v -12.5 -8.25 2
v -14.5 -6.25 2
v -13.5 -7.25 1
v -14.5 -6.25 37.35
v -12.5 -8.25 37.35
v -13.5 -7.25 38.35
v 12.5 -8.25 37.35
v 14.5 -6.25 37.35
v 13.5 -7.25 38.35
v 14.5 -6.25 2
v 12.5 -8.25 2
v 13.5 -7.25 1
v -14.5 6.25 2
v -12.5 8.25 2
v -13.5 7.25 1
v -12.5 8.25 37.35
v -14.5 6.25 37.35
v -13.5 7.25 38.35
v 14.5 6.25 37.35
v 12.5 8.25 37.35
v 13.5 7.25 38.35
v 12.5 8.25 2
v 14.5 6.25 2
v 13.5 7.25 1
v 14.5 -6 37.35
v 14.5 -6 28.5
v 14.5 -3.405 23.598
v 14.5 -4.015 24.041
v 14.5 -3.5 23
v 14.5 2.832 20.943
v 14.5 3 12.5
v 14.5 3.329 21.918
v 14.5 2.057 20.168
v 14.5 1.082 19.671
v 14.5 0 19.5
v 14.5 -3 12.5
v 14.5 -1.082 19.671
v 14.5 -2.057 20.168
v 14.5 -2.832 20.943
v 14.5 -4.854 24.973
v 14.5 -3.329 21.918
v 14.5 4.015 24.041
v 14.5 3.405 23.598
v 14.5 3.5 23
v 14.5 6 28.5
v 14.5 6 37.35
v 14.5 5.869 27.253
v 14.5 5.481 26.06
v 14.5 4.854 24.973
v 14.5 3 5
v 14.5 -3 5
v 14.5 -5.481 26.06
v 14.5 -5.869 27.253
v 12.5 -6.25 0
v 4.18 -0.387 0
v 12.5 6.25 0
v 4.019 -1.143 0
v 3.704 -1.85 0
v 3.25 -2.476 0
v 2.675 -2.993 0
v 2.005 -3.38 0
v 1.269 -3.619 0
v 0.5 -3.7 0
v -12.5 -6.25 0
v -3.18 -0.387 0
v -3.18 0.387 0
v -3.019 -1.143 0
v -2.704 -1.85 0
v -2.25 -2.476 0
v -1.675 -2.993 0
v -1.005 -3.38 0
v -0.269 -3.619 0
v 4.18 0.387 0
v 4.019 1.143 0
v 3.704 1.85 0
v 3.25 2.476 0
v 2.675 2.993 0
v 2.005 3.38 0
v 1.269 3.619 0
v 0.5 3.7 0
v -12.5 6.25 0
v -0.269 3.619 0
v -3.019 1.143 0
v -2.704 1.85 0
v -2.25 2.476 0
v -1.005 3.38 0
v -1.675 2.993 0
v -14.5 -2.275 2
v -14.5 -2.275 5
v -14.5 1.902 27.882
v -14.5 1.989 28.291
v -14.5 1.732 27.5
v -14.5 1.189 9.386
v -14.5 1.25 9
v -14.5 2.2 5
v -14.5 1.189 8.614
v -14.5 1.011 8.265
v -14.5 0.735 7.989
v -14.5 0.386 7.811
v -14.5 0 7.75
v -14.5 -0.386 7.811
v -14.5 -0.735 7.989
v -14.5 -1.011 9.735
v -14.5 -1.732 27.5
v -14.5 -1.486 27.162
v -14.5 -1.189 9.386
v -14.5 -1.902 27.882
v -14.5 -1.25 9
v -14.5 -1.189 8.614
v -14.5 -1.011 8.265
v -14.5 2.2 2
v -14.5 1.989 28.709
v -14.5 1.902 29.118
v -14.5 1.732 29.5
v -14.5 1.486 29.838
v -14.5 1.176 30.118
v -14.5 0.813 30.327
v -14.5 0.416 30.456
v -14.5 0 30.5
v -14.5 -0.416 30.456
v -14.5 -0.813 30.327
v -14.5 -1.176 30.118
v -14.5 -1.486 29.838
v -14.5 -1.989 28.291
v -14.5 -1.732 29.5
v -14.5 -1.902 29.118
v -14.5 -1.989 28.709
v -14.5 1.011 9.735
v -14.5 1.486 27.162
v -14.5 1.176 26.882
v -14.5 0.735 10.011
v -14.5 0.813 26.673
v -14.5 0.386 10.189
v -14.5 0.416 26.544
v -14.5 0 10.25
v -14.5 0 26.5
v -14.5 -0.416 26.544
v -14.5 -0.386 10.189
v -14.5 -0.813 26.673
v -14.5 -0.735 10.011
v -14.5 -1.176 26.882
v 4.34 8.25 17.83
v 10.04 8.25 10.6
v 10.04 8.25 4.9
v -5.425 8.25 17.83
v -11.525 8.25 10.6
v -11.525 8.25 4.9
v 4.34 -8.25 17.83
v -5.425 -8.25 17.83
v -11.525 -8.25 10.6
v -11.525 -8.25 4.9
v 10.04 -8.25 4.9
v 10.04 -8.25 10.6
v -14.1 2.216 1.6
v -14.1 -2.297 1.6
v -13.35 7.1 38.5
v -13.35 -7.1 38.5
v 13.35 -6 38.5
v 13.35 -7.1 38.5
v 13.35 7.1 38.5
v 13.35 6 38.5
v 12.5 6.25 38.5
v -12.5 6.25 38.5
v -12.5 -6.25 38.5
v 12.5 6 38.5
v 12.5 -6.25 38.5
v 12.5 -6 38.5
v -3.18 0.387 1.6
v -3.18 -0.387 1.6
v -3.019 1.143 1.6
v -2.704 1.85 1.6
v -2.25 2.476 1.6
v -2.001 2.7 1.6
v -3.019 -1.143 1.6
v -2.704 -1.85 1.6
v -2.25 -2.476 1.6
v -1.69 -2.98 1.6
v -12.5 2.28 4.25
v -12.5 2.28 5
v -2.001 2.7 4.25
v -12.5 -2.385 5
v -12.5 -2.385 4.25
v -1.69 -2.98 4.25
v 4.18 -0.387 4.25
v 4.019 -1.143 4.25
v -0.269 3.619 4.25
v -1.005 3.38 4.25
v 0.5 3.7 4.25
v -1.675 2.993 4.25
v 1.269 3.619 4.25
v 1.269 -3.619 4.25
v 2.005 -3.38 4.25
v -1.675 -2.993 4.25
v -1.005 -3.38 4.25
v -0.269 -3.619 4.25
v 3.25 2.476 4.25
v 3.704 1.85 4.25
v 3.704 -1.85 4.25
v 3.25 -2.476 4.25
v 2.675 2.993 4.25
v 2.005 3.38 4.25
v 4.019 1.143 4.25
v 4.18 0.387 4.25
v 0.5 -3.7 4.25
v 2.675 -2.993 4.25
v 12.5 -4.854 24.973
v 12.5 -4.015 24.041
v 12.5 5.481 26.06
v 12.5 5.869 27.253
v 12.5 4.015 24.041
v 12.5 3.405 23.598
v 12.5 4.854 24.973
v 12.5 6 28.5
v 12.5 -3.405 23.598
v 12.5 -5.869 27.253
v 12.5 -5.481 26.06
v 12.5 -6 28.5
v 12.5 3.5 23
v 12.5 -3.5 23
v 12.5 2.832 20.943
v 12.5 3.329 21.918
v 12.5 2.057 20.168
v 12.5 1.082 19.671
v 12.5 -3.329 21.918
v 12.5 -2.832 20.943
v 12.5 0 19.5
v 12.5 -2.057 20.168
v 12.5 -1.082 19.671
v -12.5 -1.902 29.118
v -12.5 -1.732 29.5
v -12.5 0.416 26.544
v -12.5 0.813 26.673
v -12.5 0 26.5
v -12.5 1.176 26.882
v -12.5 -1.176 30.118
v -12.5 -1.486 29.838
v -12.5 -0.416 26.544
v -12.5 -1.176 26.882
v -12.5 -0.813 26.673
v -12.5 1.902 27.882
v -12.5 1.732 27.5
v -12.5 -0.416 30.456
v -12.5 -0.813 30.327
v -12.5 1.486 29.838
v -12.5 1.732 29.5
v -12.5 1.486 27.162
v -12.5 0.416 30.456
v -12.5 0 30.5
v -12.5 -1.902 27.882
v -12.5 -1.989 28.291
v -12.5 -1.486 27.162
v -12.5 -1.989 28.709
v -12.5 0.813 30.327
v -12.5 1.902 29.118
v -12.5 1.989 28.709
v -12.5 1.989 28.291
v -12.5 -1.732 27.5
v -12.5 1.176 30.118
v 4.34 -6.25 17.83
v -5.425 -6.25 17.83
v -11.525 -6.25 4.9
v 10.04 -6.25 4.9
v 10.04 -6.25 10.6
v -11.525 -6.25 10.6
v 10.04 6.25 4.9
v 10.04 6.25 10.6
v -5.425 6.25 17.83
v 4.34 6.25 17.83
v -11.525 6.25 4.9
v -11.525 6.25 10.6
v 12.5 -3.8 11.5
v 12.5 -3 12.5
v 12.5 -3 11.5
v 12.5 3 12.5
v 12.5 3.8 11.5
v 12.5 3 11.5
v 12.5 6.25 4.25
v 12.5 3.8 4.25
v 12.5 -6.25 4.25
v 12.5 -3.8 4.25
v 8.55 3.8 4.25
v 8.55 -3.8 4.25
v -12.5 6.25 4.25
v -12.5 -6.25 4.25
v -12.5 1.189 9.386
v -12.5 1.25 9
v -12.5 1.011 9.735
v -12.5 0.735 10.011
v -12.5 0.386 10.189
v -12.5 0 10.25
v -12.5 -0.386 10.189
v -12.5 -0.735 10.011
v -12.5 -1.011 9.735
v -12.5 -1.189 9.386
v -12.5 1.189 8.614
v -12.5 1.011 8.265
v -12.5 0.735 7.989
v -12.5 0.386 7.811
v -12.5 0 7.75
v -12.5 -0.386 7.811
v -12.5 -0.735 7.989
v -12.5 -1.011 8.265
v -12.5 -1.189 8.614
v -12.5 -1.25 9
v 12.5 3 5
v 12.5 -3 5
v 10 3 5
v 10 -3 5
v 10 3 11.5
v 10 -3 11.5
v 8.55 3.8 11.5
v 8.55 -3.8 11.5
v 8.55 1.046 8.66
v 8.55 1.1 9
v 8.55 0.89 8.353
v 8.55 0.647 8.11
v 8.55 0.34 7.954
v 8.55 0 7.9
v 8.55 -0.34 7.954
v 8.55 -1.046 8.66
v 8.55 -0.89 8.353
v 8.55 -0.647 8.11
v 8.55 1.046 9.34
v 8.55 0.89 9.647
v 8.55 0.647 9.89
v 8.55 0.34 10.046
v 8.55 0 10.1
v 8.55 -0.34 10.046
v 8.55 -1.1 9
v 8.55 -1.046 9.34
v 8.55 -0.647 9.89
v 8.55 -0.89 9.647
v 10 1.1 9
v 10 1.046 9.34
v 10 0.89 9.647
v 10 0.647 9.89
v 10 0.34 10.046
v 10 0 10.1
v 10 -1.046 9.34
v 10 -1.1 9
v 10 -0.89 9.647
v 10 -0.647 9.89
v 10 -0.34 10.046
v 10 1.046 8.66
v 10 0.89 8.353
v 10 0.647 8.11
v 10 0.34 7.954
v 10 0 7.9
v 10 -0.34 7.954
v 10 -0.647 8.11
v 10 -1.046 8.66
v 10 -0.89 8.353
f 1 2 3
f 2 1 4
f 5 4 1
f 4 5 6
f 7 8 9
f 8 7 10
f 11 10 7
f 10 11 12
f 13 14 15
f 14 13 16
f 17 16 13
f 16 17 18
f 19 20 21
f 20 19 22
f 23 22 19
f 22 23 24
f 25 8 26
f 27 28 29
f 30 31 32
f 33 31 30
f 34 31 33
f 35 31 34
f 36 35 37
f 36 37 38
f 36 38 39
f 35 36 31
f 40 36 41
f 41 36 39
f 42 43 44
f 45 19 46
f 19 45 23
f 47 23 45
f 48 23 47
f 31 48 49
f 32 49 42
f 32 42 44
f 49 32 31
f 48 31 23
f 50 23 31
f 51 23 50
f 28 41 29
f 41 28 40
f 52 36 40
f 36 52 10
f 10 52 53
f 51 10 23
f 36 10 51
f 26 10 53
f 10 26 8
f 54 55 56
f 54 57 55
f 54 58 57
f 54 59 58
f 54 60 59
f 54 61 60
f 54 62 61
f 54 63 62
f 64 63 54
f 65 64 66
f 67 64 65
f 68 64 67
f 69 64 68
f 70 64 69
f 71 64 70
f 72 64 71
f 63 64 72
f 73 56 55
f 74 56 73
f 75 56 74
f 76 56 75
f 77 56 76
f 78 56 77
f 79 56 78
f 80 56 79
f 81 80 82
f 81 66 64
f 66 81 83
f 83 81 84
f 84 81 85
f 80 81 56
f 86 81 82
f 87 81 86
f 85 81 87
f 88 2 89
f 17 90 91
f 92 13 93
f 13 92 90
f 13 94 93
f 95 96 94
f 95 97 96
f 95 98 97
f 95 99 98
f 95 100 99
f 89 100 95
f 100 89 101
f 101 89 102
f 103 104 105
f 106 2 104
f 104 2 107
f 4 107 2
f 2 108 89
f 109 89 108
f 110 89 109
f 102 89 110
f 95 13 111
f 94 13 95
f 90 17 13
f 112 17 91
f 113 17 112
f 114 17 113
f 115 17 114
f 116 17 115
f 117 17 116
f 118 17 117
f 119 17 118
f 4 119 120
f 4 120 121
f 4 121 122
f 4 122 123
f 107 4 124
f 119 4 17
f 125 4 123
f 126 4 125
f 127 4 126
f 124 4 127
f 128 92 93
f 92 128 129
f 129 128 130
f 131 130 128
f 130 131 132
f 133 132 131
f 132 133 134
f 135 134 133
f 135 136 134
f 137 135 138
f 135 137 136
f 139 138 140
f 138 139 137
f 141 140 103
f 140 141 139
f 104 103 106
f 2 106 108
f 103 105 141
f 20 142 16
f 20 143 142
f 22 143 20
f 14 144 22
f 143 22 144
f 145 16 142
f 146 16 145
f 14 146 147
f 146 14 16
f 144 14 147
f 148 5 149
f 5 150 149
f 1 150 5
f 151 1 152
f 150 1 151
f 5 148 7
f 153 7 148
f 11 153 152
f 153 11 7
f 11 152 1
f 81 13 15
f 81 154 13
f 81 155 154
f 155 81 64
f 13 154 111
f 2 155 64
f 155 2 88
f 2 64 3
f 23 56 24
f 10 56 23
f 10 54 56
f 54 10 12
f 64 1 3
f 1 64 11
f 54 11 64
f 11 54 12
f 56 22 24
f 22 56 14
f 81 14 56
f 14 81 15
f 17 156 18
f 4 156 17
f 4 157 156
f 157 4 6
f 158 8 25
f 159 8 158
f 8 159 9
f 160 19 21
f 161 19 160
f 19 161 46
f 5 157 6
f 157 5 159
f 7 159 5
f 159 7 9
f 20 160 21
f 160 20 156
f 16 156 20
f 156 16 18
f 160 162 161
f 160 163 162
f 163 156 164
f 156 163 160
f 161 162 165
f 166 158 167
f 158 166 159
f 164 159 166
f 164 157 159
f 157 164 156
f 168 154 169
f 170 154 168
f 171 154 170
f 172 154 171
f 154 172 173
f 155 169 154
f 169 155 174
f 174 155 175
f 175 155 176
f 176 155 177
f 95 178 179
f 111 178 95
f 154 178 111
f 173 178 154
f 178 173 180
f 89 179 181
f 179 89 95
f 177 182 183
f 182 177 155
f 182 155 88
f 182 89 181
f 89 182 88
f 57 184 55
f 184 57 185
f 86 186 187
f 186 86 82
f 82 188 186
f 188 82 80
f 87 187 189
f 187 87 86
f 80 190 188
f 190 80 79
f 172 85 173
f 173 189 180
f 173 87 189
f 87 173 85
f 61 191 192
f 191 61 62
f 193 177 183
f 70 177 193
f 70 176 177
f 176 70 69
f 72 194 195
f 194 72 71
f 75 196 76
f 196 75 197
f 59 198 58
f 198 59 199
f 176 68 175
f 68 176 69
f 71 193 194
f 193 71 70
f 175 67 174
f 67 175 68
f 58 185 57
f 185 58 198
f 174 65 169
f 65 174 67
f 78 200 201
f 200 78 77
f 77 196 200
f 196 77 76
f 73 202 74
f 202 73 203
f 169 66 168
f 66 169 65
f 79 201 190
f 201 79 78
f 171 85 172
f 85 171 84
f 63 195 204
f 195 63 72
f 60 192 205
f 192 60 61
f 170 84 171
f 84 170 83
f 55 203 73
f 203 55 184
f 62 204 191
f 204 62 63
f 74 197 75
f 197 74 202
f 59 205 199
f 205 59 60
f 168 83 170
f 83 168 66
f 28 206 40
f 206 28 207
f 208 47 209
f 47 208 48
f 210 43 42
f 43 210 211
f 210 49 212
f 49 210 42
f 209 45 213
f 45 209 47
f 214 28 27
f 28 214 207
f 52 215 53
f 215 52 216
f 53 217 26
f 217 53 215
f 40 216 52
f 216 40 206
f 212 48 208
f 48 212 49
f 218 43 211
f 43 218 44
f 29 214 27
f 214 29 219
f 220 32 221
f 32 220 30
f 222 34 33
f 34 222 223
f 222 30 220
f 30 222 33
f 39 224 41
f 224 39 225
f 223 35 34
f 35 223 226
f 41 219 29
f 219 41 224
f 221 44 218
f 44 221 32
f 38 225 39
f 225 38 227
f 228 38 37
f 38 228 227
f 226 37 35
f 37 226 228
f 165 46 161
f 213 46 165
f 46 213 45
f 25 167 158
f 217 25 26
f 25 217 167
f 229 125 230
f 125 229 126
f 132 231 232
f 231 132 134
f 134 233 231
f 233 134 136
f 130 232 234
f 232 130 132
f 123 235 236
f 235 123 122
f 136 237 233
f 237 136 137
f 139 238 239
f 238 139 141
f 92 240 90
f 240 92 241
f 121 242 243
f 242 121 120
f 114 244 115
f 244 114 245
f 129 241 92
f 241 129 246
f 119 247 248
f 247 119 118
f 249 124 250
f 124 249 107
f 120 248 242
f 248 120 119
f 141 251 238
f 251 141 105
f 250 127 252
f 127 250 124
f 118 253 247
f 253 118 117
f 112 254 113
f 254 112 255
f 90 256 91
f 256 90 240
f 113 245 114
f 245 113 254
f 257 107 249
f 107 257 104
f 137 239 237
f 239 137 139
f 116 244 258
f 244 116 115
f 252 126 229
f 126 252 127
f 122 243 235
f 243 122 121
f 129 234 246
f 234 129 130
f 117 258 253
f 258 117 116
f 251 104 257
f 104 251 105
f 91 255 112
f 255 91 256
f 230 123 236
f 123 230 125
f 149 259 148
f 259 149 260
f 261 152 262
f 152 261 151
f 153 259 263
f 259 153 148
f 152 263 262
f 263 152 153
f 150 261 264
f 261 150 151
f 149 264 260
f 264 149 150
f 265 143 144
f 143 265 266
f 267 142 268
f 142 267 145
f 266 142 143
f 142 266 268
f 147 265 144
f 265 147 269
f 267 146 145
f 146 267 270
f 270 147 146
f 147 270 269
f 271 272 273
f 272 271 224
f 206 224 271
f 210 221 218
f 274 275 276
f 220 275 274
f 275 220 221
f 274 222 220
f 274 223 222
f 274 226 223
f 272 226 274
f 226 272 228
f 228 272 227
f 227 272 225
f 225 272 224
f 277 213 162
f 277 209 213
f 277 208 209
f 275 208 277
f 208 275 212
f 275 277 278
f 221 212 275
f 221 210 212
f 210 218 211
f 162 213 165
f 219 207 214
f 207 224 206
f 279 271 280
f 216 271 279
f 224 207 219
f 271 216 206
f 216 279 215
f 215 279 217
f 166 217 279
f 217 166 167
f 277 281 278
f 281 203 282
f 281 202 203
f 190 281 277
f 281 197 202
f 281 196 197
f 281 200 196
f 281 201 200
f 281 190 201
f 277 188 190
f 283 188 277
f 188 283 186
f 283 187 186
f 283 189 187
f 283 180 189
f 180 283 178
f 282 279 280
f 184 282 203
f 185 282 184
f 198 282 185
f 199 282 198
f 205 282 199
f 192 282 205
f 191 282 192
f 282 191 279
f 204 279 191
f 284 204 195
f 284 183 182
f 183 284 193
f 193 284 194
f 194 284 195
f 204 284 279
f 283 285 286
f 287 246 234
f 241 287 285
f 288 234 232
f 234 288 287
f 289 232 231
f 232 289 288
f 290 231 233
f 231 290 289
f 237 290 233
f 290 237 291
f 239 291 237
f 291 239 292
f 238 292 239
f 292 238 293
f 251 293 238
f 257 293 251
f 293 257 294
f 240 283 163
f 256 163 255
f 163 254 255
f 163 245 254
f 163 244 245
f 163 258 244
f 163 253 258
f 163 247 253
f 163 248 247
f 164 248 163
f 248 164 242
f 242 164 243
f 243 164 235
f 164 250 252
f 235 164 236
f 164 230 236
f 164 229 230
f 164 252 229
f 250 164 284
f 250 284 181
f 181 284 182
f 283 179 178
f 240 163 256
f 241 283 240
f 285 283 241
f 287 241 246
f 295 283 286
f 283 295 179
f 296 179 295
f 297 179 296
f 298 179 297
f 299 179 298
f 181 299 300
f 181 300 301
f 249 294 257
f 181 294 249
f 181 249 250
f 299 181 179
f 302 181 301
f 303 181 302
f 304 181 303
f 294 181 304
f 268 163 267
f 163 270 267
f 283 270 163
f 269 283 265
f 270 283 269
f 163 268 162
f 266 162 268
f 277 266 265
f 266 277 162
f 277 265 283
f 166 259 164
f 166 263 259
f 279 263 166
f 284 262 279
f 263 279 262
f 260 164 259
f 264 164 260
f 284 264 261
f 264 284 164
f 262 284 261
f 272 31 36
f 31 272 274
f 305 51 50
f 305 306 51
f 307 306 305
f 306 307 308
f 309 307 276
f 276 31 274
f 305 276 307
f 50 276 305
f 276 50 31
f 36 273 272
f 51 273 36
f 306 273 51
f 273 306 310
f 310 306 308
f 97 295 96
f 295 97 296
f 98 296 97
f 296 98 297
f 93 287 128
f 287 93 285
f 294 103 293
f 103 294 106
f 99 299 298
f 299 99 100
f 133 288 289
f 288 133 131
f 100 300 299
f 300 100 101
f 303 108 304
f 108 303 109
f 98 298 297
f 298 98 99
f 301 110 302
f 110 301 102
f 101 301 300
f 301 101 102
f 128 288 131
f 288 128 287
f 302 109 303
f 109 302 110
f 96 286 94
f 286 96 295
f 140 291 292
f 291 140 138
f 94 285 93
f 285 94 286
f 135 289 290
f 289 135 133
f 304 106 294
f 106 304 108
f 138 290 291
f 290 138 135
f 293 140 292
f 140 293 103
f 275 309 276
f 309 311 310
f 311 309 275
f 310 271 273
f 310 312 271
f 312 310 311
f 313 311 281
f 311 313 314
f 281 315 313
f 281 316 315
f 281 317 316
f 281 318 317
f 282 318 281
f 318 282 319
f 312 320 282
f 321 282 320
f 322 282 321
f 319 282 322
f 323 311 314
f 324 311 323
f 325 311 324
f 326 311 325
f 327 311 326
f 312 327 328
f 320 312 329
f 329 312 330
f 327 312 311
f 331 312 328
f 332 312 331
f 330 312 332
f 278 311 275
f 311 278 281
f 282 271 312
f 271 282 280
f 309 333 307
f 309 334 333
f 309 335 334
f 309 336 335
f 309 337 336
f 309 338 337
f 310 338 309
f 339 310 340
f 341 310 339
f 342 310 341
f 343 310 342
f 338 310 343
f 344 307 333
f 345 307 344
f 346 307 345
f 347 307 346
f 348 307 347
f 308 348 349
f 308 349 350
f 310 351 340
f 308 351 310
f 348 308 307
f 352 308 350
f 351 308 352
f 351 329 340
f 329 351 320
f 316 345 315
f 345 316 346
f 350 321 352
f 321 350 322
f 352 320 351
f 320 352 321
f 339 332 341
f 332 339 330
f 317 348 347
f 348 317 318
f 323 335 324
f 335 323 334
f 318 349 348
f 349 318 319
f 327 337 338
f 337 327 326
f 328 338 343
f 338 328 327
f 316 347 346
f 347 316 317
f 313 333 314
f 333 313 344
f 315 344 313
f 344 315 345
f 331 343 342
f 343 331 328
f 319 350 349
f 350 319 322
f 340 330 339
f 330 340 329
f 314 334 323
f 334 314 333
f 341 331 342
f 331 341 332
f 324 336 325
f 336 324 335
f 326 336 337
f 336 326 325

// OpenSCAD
// Part to print
part="leg"; // [all:Preview Bot,head:Head,body:Body,leg:Leg,foot_left:Left Foot,foot_right:Right Foot]

// Brain type (hole pattern in head)
brain_type="nano_shield"; // [nano_shield:Stock (Arduino Nano + Servo Shield),nano_proto:Arduino Nano + Proto board,uno_shield:Arduino Uno + Servo Shield,uno:Arduino Uno (and wires)]

// Servo Type for hip
servo_type_hip="sg90"; // [sg90:SG90 (nylon gear micro servo),mg90s:MG90S (metal gear micro servo)]

// Servo Type for ankle
servo_type_ankle="mg90"; // [sg90:SG90 (nylon gear micro servo),mg90s:MG90S (metal gear micro servo)]

// Body Width (Head width is based off this)
body_width=67; // [67:200]

// Body Depth (Head depth is based off this)
body_depth=68; // [68:200]

// Body Height
body_height=38; // [20:200]

// Head Height
head_height=34; // [20:200]

// Body Shell Thickness
body_thickness=1.75; // [0.25:0.25:8]

// Head Shell Thickness
head_thickness=2; // [0.25:0.25:8]

// Nose Diameter (6 = Small Toggle Switch)
nose_diameter=6; // [0:24]
// Vertical distance between center of eyes and nose
nose_distance=15; // [-8:190] 

// Brain Screw Size (2 = Stock)
brain_screw_size=2; // [2:5]

// Make Brain Screw thru Skull
brain_screw_thru=0; // [1:Yes,0:No]

// Solid leg
leg_solid=0; // [1:Yes, solid,0:No, my printer doesn't like those overhangs]

/* [Hidden] */
part_clearance=0.25;

arduino_holes=[[-27,-7],[-27,20.9],[25.2,26.1],[23.825,-22.25]];
proto_holes=[[27,-10],[-17.9,-10],[26,25.5],[-17.7,25.5]];

print_part();

module print_part() {
  warnings()
    draw_part();
}

module draw_part() {
  if(part=="head")
    head();
  else if(part=="body")
    body();
  else if(part=="leg")
    leg();
  else if(part=="foot_left")
    foot();
  else if(part=="foot_right")
    mirror([1,0]) foot();
  else if(part=="all")
    rotate([0,0,-90]) otto();
}
module otto() {
  head(move=1);
  body(move=1);
  mirrory() {
    translate([0,body_width/2-33.5,0])
    {
      mirror([1,0]) foot(move=1);
      translate([0,24,-1]) mirror([0,0,1]) leg(move=0);
    }
  }
}
function brain_type_text() = (
  brain_type=="nano_shield"?"Arduino Nano + Servo Shield":(
  brain_type=="uno_shield"?"Arduino Uno + Servo Shield":(
  brain_type=="nano_proto"?"Arduino Nano + Proto board":"Unknown")));
module warnings() {
  if(brain_type=="nano_shield")
  {
    if(body_width<67)
      error(str("If ",brain_type_text()," is used, Body Width must be >= 67!"));
    else if(body_depth<67)
      error(str("If ",brain_type_text()," is used, Body Depth must be >= 67!"));
    else children();
  } else if(brain_type=="uno_shield"||brain_type=="uno")
  {
    if(body_width<81)
      error("If Arduino Uno is used, body width MUST be greater than 81!");
    else children();
  } else children();
}
module error(s) {
  echo(str("***ERROR*** ",s));
  rotate([0,0,-45])
        rotate([80,0,0]) color("red") text(s);
}
module body(dims=[body_depth-1,body_width,body_height]) {
  left=dims[0]/-2; // -33.5
  botm=dims[1]/-2; // -33.5
  right=dims[0]/2; // 34
  servozoff=servo_type_hip=="sg90"?2:0;
  *#import("Otto_DIY/files/OTTO_body_v3.stl");
  mirrorx(0.4) mirrory(0.25) translate([left+body_thickness,botm+body_thickness+13.775,body_thickness]) {
      cube([dims[0]/2-9,2.5,12.4]);
      translate([0,2.5,12.39]) rotate([90,0,90]) mirror([1,0]) linear_extrude(dims[0]/2-9,convexity=10) polygon([[0,0],[1.2,0.825],[2.5,0.825],[2.5,0]]);
  }
  mirrory() mirrorx() translate([left+body_thickness-.01,botm+6,dims[2]-16]) difference(){
    cube([2,13.7,5]);
    translate([0,-.01]) rotate([0,41]) cube([3,13.72,5]);
  }
  mirrory() for(x=[0,28.2]) translate([x-9.5,botm+body_thickness,body_thickness]) difference() {
    union(){
      cube([2,13.775,6.18-servozoff]);
      translate([0.98,6.85,0]) cylinder(d1=5.7,d2=4.4,h=0.85,$fn=30);
      translate([0.98,6.85,0.84]) cylinder(d=4.4,h=5.35-servozoff,$fn=40);
    }
      translate([0.98,6.85,-.01]) cylinder(d=1.9,h=7,$fn=20);
  }
  for(mx=[0,1],my=[0,1]) mirror([mx,0]) mirror([0,my]) translate([mx?-11:0,0])
  translate([left+body_thickness+22.2,botm+body_thickness,body_thickness]) difference() { union() {
      if(!mx&&!my)
        translate([-10.7,6.61])
          cylinder(d=16,h=6.25-servozoff,$fn=50);
      else if(!mx&&my)
        translate([-17.5,0,.01]) cube([11.9,13.2,6-servozoff]);
      translate([-1-(left+33),5.64,0]) mirror([1,0]) cube([(mx?-22:-12)-left,2,6.1-servozoff]);
    }
    if(!mx&&!my)
      translate([-10.72,6.61,-.01]) cylinder(d=12,h=6.27,$fn=40);
    else if(!mx&&my)
      translate([-15.9,5,-.01]) {
        cube([8.35,8.2,7]);
        translate([0,-6]) cube([8.35,4,7]);
      }
  }
  difference() {
      translate([left,botm,0]) box_chamfer(dims,ch=2,chvx=5,chvy=5);
//    translate([left+1.75,botm+1.75,2]) box_chamfer([dims[0]-3.5,dims[1]-3.5,dims[2]],ch=1,chvx=4,chvy=4,inside=1);
    translate([left+body_thickness,botm+body_thickness,2]) box_chamfer([dims[0]-body_thickness*2,dims[1]-body_thickness*2,dims[2]],ch=1,chvx=4,chvy=4,inside=1);
    translate([0,0,-1]) linear_extrude(10,convexity=10) {
      mirrory() {
        translate([.1,botm+8.5]) circle(d=12,$fn=30);
        translate([6,botm+8.5]) circle(d=servo_type_hip=="mg90s"?6.5:7,$fn=20);
        offset(-1) offset(1)
        translate([-14.5,-15]) square([29,4]);
      }
      translate([left+9,-botm-13.5]) square([5.2,5.2]);
      translate([left+12.8,botm+8.35]) {
        circle(d=2,$fn=20);
        for(r=[2:360/7:359]) rotate([0,0,r]) translate([4.1,0]) circle(d=2,$fn=20);
      }
    }
    mirrory() translate([-11.7,right-body_thickness-.51,dims[2]-11]) {  cube([22.35,body_thickness+0.6,4]);
      translate([0,body_thickness+.02,4.1]) rotate([-35,0]) mirror([0,0,1]) mirror([0,1,0]) cube([22.35,4,5.4]);
    }
  }
}
module head(dims=[
    body_width-(body_thickness+part_clearance)*2,
    body_depth-(body_thickness+part_clearance)*2,
    head_height],brain_type=brain_type,head_thickness=head_thickness,move=0) {
  left=dims[0]/-2; // -31.5
  botm=dims[1]/-2; // -32.25
  right=dims[0]/2; // 31.5
  translate(move?[0,0,body_height+head_height-3]:[]) rotate(move?[180,0,-90]:[]) {
    //#import("Otto_DIY/files/OTTO_head_v3.stl");
    difference(){
      translate([left,botm,0]) box_chamfer(dims,ch=2,chy1=3.5,chvx=5.5,chvy=4);
      translate([left+head_thickness,botm+head_thickness+1.501,head_thickness]) box_chamfer([dims[0]-head_thickness*2,dims[1]-head_thickness*2-1.5,dims[2]],ch=1,chvx=2.75,chvy=2.75,inside=1);
      translate([left,botm-.01,dims[2]-3.8]) cube([dims[0],1.5,10]);
      for(x=[-13.25,13.25])
        translate([x,botm-.01,15]) rotate([-90,0]) cylinder(d=16.5,h=4,$fn=50);
      brain_holes(brain_type,top=dims[1]/2-20,right=dims[0]/2);
      translate([-5.6,-29.555,3.75]) {
        translate([11.25,0]) rotate([-90,0]) rotate([0,0,180]) intersection() {
          box_chamfer([11.3,7.6,2],ch=0,chvx=1.6,chvy=1.6);
          translate([0,0,-.8]) box_chamfer([11.3,7.6,4],ch=1.6,chvx=0,chvy=0);
          
        }
      }
      if(nose_diameter>0&&dims[2]-(nose_diameter/2+nose_distance)>18)
      {
        translate([0,botm-.01,15+nose_distance]) rotate([-90,0]) cylinder(d=nose_diameter,h=head_thickness+2.02,$fn=30);
      } else echo(str("Warning: Hiding nose."));
    }
    // tabs
    mirrorx() translate([-left-2,-9.25,dims[2]]) rotate([-90,0]) mirror([0,1,0]) linear_extrude(21,convexity=10) polygon([[0,0],[0,8.4],[1.98,8.4],[4.1,6.3],[4.1,4.2],[2,2.5],[2,0],]);
    mirrory(0.75) mirrorx(0) translate([left+4.5,botm+1.5,dims[2]]) rotate([90,0]) mirror([0,0,1]) linear_extrude(2) polygon([[0,0],[0,6],[2,8],[12,8],[14,6],[14,1.5],[15.5,0]]);
    brain(brain_type=brain_type,top=dims[1]/2-20,right=dims[0]/2);
  }
}
module leg(move=0) {
  bo=servo_type_ankle=="sg90"?0:(
    servo_type_ankle=="mg90s"?1.6:0);
  translate(move?[0,24,-40]:[]) rotate([0,0,0]) union(){
  //#import("Otto_DIY/files/OTTO_leg_v4.stl");
  difference() {
    //the Leg-Box
    translate([-14.5,-8.25,0]) {
      intersection() {
        cube([29,16.5,38.5]);
        union(){
          box_chamfer([29,16.5,20],2);
          translate([0,0,38.6]) mirror([0,0,1]) box_chamfer([29,16.5,20],1.25,chvx=2,chvy=2);
          *translate([1,1,30])
            box_chamfer2([29-2,16.5-2,7],2);
        }
      }
    }
    //servo cutouts 1
    translate([-12.5,-6.25,4.25]) cube([25,12.5,50]);
    translate([12,-3,5]) cube([6,6,7.5]);
    
    //the arm
    translate([0.5,0,2.6-(servo_type_hip=="mg90s"?0:1)]) rotate([0,0,90]) {
      linear_extrude(3.4) 
        polygon([[-3.1,0],[-2,20],[2,20],[2.8,0]]); 
      translate([0,0,-3.01]) cylinder(d=servo_type_ankle=="mg90s"?7.8:7.4,h=8,$fn=30);

    }
    //servo cutouts 2 
    translate([-14.5-.01,0,28.5]) rotate([0,90,0]) {  cylinder(d=4,h=5,$fn=30);
      rotate([0,0,90]) translate([0,0,5]) {
        cylinder(d=12,h=30,$fn=30);
        translate([0,-5.5]) cylinder(d=servo_type_ankle=="mg90s"?6.5:7,h=30,$fn=20);
        translate([-6,0]) cube([12,30,30]);
      }
    }
    
    if(!leg_solid)
      mirrory() translate([-11.525,-8.3,4.9]) mirror([0,1,0]) rotate([90,0]) linear_extrude(5) {
      //square([21.565,12.93]);
      polygon([[0,0],[0,5.7],[6.1,12.93],[21.565-5.7,12.93],[21.565,5.7],[21.565,0]]);
    }
    translate([-15,0,9]) rotate([0,90,0]) cylinder(d=2.5,h=5,$fn=20);
  }
  difference() {
    translate([8.55-bo,-3.8,4]) cube([4+bo,7.6,7.5]);
    translate([10-bo,-3,5]) cube([4+bo,6,8]);
    translate([8.5-bo,0,9]) rotate([0,90,0]) cylinder(d=2.2,h=2,$fn=20);
  }
}
}
module foot(move=0) {
  servohornoff=(servo_type_ankle=="sg90"?2:0);
  translate(move?[0,34.5,-48]:[])
  //*translate([0,44,0]) import("Otto_DIY/files/OTTO_footL_v4.stl");
  difference(){
    union(){
      translate([-31,-20,0]) {
        intersection() {
          cube([62,40,5]);
          translate([0,0,-3]) box_chamfer3([62,40,8.01],2);
          *translate([2.8,2.8,0]) box_chamfer2([56.3,34.4,2.5],4);
        }
      }
      translate([15.8,-9.5,15.75]) sphere(d=4,$fn=30);
      for(m=[0,1]) mirror([m,0])
      translate([-21.15,-20,0]) difference() {
        intersection(){
          cube([4+(m?1.1:1.5),21,24.5+(m?0:2)]);
          box_chamfer3([41.8,21,25+(m?0:2)],2);
          *translate([2.8,2.8,0]) box_chamfer2([36.2,15.4,22.5],4);
        }
        translate([5.5,-.01,-.01]) cube([31.3,21.02,25.02]);
        if(m==0)
        translate([-.01,10.5,15.5]) rotate([0,90]) {
            cylinder(d=7.3,h=6+servohornoff,$fn=30);
            translate([-8,0]) cylinder(d=1,h=6+servohornoff,$fn=10);
            rotate([0,0,90]) linear_extrude(2+servohornoff) {
            polygon([[-3.5,0],[-2,10+(m?0:2)],[2,10+(m?0:2)],[3.5,0]]);
          }
        }
      }
    }
    translate([-15.7,-21.01,1]) {
      translate([0,-1,0]) box_chamfer3([31.8,26.02,10],2);
      *intersection(){
        cube([31.8,25.02,10]);
        translate([2,0,2.8]) box_chamfer2([27.3,22,8],4);
      }
    }
  }
}
module brain_holes(brain_type=brain_type,
    right=(body_width-(body_thickness+part_clearance)*2)/2,
    top=(body_depth-(body_thickness+part_clearance)*2)/2-20) {
    blo=(brain_type=="uno_shield"||brain_type=="uno"?14:0);
    bto=(brain_type=="uno_shield"?4:(brain_type=="nano_shield"?-.5:0));
  if(brain_type=="nano_proto") {
    translate([right-2.76,-.2,20.5]) rotate([0,90]) rotate([0,0,90]) usb_mini();
  }
  if(brain_type=="nano_shield"||brain_type=="uno_shield"||brain_type=="uno")
  {
    translate([right-31.5-blo,top-12.5-bto,brain_screw_thru?-.01:head_thickness]) for(pos=arduino_holes) translate(pos) cylinder(d=brain_screw_size,h=3+head_thickness+.02,$fn=24);
  }
  if(brain_type=="nano_shield") {
    translate([0,top-12])
    {
    translate([right+.01,18.163,12.875]) rotate([0,-90]) cylinder(d=8,h=4,$fn=24);
    translate([right-2.76,12.5,4.815]) cube([2.06,10.5,14.2]);
    translate([right-2.76,-2.4,19.5]) rotate([0,90]) rotate([0,0,90]) usb_mini();
    }
  } else if(brain_type=="uno_shield"||brain_type=="uno") {
    translate([right-head_thickness-.01,top,7]) {
      cube([head_thickness+.02,8.9+part_clearance*2,10.9+part_clearance*2]);
      translate([0,-31.7]) cube([head_thickness+.02,12+part_clearance*2,10.9+part_clearance*2]);
    }
  }
}
module brain(brain_type=brain_type,
  right=(body_width-(body_thickness+part_clearance)*2)/2,
  top=(body_depth-(body_thickness+part_clearance)*2)/2-20)
{
  blo=(brain_type=="uno_shield"||brain_type=="uno"?14:0);
  bto=(brain_type=="uno_shield"?4:(brain_type=="nano_shield"?-.5:0));
  translate([right-31.5-blo,top-12.5-bto]) {
  if(brain_type=="nano_shield"||brain_type=="uno_shield"||brain_type=="uno") {
    translate([-25.4,-25,2]) mirror([0,1]) cube([2,4.9+(top-12),3.9]);
    translate([-27-brain_screw_size/2,-8,2]) mirror([1,0]) cube([3-brain_screw_size/2+(right-34),2,3]);
    translate([-27-brain_screw_size/2,20,2]) mirror([1,0]) cube([3-brain_screw_size/2+(right-34),1.98,3]);
    translate([-25.375,29.075,2]) cube([2,1.5+bto,3.9]);
    translate([23.626,29.075,2]) cube([2,1.5+bto,3.9]);
    translate([27,25,2]) cube([4,2,3]);
    translate([22.877,-24,2]) mirror([0,1]) {
      translate([0,1.125]) cube([2,4.875+(top/2+bto-6),3.9]);
      cube([2,6,3]);
    }
    translate([0,0,1.99]) for(pos=arduino_holes)
      translate(pos) brain_screw();
  } else if(brain_type=="nano_proto") {
    translate([0,2,2]) cube([10,4,3]);
    translate([0,0,2]) for(pos=proto_holes)
       translate(pos) {
         difference() {
           union() {
             brain_screw();
             if(pos[1]>0)
              translate([-1,2]) cube([2,4,3]);
             else if(pos[0]>15)
               translate([0,-1]) cube([4,2,3]);
           }
           translate([0,0,-.01]) cylinder(d=2,h=4.02,$fn=20);
       }
     }
     }
  }
}
module brain_screw(brain_screw_size=brain_screw_size) {
  difference() {
    union(){
      cylinder(d=brain_screw_size+2.3,h=3,$fn=30);
      cylinder(d1=brain_screw_size+4,d2=brain_screw_size+2.3,h=1,$fn=30);
    }
    translate([0,0,-.01]) cylinder(d=brain_screw_size,h=4.02,$fn=20);
  }
}
module usb_mini() {
  linear_extrude(3,convexity=10) {
    translate([0.6,0]) union() {
      translate([0,0.1]) square([8-1.202,4]);
      for(x=[0.1,6.7]) translate([x,0.1]) circle(r=0.1,$fn=20);
      translate([0.1,0]) square([6.6,4]);
    }
    mirrorx(3.999) translate([0.4,1.81]) difference() {
      square([0.2,0.2]);
      circle(r=0.2,$fn=20);
    }
    translate([0,2.008]) union() {
      translate([0.1,0.2]) square([7.8,1.9]);
      translate([0.2,0]) square([7.6,2.1]);
      translate([0,0.1]) square([8,1.9]);
      for(x=[0.2,7.8])
        translate([x,0.2]) circle(r=0.2,$fn=20);
      for(x=[0.1,7.9])
        translate([x,2]) circle(r=0.1,$fn=20);
    }
  }
}

module box_chamfer3(dims,ch=1,bot=1)
{
  render() intersection() {
    cube(dims);
    minkowski()
    {
      translate([ch,ch,ch]) cube([dims[0]-ch*2,dims[1]-ch*2,dims[2]-ch*2]);
      *sphere(r=ch/sin(60),$fn=10);
      for(m=[0,1]) mirror([0,0,m]) 
        cylinder(r1=ch,r2=m?(bot?0:ch):0,h=ch,$fn=4);
    }
  }
}
module box_chamfer2(dims,ch=1)
{
  render() minkowski()
  {
    cube(dims);
    intersection()
    {
      rotate([45,0,45]) cube(ch,center=true);
      rotate([45,0,-45]) cube(ch,center=true);
    }
  }
}
module box_chamfer(dims,ch=1,chx1="auto",chx2="auto",chy1="auto",chy2="auto",chvx="auto",chvy="auto",inside=0) {
  x1=chx1=="auto"?ch:chx1;
  x2=chx2=="auto"?ch:chx2;
  y1=chy1=="auto"?ch:chy1;
  y2=chy2=="auto"?ch:chy2;
  vx=chvx=="auto"?ch:chvx;
  vy=chvy=="auto"?ch:chvy;
  difference(){
    cube(dims);
    if(x1)
    {
      translate([x1,-.01]) rotate([0,-45]) mirror([1,0]) cube([x1*2,dims[1]+.02,x1*2]);
      *if(vx)
      translate([9.9,0]) rotate([0,0,45]) translate([-5+x1,0]) translate([x1,-.01]) rotate([0,-45]) mirror([1,0])  cube([x1*2,dims[1]+.02,x1*2]);
    }
    if(x2)
      translate([dims[0]-x2,-.01]) rotate([0,45]) cube([x2*2,dims[1]+.02,x2*2]);
    if(y1)
      translate([-.01,y1]) rotate([45,0]) mirror([0,1,0]) cube([dims[0]+.02,y1*2,y1*2]);
    if(y2)
      translate([-.01,dims[1]-y2]) rotate([-45,0]) cube([dims[0]+.02,y2*2,y2*2]);
    if(vx)
    {
      mirrorx(dims[0]/2) {
        translate([vx,0,-.01]) rotate([0,0,45]) mirror([1,0]) cube([vx*2,vx*2,dims[2]+.02]);
        translate([inside?-1.4:-1.5,inside?0:-1.1]) rotate([0,0,45])
        mirror([1,0,0]) rotate([0,45,0])
        translate([-vx,-vx]) translate([0,0,vx/-.75]) cube([10,vx*2,vx*2]);
      }
    }
    if(vy)
      mirrorx(dims[0]/2) {
        translate([0,dims[1]-vy,-.01]) rotate([0,0,-45]) mirror([1,0]) cube([vy*2,vy*2,dims[2]+.02]);
        translate([0,dims[1]+(inside?-0.25:0.5),-.01])
          rotate([0,0,-45]) mirror([1,0,0])
          rotate([0,-45,0])
          translate([-vx,-vx]) translate([0,0,vx/-.75]) 
          cube([10,vx*2,vx*2]);
      }
  }
}
module mirrory(offset=0)
{
  translate([0,offset,0]) for(m=[0,1]) mirror([0,m,0]) translate([0,offset*-1,0]) children();
}
module mirrorx(offset=0)
{
  translate([offset,0]) for(m=[0,1]) mirror([m,0]) translate([offset*-1,0]) children();
}
module otto_stl() {
  translate([0,0,66]) rotate([180,0,-90]) import("Otto_DIY/files/OTTO_head_v3.stl");
  import("Otto_DIY/files/OTTO_body_v3.stl");
  translate([0,-34.5,-48]) import("Otto_DIY/files/OTTO_footR_v4.stl");
  translate([0,34.5,-48]) import("Otto_DIY/files/OTTO_footL_v4.stl");
  for(y=[-25,25])
    translate([0,y,-40]) rotate([0,0,0]) import("Otto_DIY/files/OTTO_leg_v4.stl");
}
